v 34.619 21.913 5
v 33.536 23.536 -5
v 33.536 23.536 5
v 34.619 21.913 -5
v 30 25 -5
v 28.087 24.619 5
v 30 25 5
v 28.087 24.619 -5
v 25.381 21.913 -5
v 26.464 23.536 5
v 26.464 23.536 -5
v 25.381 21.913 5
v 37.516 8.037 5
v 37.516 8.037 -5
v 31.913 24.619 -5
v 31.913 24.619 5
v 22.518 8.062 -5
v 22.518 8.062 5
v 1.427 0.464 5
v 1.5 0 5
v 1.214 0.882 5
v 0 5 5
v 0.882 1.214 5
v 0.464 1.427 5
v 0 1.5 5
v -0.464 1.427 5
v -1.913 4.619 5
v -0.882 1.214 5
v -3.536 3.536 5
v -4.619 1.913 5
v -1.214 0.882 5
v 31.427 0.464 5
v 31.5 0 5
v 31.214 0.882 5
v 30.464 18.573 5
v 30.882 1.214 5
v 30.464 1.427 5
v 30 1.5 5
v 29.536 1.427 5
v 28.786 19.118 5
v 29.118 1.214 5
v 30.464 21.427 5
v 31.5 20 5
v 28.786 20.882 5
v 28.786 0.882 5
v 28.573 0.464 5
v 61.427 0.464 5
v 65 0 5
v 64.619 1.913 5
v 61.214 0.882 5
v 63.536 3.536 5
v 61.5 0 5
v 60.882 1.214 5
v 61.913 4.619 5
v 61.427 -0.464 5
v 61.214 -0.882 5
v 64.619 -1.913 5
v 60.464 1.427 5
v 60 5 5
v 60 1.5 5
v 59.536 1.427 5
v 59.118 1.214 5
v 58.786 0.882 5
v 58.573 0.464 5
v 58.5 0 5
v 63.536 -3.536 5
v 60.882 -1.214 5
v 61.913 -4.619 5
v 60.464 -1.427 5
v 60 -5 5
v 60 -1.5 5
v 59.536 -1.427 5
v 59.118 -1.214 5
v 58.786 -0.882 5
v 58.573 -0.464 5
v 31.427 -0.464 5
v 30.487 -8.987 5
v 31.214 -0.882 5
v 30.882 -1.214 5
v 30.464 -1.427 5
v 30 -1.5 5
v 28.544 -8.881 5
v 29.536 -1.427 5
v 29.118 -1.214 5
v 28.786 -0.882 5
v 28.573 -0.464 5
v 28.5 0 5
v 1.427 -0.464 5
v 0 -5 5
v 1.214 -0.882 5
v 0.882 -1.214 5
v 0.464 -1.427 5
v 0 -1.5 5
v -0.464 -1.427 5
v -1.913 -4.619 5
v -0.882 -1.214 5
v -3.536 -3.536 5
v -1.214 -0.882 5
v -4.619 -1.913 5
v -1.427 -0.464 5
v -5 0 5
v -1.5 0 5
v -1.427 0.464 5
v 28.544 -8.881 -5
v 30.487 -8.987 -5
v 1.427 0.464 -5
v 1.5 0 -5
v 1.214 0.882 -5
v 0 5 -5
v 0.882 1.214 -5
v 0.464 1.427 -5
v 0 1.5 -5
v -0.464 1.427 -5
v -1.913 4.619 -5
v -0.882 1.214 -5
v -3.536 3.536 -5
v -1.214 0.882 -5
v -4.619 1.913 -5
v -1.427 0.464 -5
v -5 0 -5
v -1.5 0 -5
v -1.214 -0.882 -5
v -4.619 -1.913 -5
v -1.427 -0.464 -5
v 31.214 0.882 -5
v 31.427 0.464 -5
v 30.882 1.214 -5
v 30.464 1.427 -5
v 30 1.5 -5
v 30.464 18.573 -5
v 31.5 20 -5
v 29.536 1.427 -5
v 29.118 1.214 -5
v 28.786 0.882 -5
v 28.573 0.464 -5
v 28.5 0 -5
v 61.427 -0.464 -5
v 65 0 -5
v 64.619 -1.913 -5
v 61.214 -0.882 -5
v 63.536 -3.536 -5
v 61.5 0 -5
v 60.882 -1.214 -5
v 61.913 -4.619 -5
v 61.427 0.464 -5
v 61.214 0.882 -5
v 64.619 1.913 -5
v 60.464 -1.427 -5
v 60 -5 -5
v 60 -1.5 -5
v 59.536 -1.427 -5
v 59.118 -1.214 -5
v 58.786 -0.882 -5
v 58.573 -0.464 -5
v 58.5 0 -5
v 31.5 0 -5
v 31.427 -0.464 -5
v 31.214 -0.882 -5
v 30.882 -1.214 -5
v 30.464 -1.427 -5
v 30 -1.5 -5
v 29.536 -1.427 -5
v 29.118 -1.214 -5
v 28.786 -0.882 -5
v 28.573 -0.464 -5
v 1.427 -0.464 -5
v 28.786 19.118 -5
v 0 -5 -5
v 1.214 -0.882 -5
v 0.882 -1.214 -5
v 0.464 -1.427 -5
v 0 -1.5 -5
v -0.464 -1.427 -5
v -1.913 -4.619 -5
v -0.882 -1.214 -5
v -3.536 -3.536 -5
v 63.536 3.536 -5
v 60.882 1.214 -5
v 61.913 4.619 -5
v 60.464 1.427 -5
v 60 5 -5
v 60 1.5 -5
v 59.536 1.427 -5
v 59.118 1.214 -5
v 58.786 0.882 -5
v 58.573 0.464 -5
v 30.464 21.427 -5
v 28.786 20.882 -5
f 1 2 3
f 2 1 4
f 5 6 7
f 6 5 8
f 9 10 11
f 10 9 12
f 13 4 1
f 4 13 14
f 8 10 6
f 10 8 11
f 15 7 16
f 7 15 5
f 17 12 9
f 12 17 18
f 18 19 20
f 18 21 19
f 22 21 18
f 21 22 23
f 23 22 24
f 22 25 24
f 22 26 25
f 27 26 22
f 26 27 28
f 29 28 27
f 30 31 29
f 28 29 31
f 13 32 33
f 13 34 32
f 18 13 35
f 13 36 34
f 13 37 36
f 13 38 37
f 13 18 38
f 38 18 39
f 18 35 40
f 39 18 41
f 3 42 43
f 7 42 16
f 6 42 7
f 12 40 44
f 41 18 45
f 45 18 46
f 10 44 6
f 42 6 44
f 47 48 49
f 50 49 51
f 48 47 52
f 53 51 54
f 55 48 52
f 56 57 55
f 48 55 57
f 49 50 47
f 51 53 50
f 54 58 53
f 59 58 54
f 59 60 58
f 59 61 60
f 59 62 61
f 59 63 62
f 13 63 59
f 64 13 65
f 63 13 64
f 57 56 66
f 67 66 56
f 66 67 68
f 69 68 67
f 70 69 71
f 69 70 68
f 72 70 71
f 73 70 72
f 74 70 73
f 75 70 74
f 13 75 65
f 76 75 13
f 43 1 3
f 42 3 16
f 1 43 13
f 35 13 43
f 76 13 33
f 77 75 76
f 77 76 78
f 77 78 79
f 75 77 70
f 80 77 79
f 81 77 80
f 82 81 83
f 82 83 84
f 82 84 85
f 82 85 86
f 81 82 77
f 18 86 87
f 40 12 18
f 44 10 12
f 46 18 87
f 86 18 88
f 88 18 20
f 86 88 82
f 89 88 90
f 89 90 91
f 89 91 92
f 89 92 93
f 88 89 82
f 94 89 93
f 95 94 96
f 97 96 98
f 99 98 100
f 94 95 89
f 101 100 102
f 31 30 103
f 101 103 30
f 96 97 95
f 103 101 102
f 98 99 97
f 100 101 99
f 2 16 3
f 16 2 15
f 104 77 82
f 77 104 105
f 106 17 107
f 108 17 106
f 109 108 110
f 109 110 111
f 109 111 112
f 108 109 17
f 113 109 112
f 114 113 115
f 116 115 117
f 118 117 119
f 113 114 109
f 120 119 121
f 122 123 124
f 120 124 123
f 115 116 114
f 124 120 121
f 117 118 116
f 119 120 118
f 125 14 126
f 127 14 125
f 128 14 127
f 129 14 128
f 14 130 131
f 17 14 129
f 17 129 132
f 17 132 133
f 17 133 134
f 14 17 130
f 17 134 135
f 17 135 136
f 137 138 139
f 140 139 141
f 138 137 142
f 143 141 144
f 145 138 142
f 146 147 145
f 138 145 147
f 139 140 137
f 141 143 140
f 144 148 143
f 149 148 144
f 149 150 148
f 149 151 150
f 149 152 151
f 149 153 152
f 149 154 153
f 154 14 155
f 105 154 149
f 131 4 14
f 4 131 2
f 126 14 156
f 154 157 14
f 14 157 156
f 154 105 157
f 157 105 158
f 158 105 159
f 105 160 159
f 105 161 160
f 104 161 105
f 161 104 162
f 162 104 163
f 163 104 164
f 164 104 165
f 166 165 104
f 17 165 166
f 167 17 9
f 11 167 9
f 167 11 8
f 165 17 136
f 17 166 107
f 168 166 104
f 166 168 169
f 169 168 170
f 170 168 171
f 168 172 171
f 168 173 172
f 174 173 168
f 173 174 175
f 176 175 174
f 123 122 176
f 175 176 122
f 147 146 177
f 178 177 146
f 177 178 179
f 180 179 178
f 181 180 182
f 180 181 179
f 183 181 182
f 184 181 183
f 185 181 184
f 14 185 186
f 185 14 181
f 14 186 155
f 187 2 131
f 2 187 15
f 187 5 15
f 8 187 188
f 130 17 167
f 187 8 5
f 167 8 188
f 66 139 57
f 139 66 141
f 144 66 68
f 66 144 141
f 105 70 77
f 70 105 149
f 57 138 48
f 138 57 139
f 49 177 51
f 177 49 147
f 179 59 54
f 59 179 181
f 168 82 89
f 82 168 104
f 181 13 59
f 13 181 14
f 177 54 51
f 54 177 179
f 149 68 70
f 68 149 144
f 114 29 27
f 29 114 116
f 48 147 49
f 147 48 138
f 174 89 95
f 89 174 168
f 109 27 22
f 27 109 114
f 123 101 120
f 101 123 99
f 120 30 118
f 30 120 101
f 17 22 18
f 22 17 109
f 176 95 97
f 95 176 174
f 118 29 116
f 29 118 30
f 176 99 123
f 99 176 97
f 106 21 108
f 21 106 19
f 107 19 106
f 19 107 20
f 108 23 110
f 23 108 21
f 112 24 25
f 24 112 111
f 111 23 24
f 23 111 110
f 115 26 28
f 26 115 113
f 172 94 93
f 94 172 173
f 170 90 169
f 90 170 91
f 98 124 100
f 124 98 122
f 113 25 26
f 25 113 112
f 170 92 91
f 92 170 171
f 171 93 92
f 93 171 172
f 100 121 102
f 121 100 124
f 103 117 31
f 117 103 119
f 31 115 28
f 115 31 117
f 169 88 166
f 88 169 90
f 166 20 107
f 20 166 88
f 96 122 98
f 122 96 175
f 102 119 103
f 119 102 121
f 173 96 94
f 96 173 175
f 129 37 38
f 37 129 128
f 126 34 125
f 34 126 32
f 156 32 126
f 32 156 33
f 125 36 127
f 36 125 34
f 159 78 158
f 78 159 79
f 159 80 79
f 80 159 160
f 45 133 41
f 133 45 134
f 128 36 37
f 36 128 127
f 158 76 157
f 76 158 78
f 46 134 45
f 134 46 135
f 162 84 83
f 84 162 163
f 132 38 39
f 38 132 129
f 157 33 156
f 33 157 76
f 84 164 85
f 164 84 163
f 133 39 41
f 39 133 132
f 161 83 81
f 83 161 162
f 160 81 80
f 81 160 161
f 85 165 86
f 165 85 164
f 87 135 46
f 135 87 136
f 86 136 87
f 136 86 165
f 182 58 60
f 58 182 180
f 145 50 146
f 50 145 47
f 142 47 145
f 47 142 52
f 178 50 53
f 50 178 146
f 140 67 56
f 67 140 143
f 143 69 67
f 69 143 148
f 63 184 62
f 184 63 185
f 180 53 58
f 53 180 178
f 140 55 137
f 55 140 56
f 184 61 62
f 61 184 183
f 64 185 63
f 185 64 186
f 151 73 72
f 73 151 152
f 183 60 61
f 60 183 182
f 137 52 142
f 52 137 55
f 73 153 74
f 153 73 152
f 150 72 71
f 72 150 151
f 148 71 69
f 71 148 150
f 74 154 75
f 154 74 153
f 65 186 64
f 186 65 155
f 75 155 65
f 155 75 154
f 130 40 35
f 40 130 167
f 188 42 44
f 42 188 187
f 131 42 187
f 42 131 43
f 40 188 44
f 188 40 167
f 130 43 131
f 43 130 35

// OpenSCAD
//Hull test

module beam(thickness) {
	
		difference() {
		union() {
			hull(){
			translate([30,0,0])
				cylinder(d=18,h=thickness,center=true);
			translate([30,20,0])
				cylinder(d=10,h=thickness,center=true);	
			};
			hull(){
			cylinder(d=10,h=thickness,center=true);
			translate([30,0,0])
				cylinder(d=18,h=thickness,center=true);
			translate([60,0,0])
				cylinder(d=10,h=thickness,center=true);
				
			};
			
		}
		//Holes
		cylinder(d=3,h=thickness*1.2,center=true,$fn=20);
		translate([30,0,0])
			cylinder(d=3,h=thickness*1.2,center=true,$fn=20);
		translate([60,0,0])
			cylinder(d=3,h=thickness*1.2,center=true,$fn=20);
		translate([30,20,0])
			cylinder(d=3,h=thickness*1.2,center=true);
	}
}

beam(10);
